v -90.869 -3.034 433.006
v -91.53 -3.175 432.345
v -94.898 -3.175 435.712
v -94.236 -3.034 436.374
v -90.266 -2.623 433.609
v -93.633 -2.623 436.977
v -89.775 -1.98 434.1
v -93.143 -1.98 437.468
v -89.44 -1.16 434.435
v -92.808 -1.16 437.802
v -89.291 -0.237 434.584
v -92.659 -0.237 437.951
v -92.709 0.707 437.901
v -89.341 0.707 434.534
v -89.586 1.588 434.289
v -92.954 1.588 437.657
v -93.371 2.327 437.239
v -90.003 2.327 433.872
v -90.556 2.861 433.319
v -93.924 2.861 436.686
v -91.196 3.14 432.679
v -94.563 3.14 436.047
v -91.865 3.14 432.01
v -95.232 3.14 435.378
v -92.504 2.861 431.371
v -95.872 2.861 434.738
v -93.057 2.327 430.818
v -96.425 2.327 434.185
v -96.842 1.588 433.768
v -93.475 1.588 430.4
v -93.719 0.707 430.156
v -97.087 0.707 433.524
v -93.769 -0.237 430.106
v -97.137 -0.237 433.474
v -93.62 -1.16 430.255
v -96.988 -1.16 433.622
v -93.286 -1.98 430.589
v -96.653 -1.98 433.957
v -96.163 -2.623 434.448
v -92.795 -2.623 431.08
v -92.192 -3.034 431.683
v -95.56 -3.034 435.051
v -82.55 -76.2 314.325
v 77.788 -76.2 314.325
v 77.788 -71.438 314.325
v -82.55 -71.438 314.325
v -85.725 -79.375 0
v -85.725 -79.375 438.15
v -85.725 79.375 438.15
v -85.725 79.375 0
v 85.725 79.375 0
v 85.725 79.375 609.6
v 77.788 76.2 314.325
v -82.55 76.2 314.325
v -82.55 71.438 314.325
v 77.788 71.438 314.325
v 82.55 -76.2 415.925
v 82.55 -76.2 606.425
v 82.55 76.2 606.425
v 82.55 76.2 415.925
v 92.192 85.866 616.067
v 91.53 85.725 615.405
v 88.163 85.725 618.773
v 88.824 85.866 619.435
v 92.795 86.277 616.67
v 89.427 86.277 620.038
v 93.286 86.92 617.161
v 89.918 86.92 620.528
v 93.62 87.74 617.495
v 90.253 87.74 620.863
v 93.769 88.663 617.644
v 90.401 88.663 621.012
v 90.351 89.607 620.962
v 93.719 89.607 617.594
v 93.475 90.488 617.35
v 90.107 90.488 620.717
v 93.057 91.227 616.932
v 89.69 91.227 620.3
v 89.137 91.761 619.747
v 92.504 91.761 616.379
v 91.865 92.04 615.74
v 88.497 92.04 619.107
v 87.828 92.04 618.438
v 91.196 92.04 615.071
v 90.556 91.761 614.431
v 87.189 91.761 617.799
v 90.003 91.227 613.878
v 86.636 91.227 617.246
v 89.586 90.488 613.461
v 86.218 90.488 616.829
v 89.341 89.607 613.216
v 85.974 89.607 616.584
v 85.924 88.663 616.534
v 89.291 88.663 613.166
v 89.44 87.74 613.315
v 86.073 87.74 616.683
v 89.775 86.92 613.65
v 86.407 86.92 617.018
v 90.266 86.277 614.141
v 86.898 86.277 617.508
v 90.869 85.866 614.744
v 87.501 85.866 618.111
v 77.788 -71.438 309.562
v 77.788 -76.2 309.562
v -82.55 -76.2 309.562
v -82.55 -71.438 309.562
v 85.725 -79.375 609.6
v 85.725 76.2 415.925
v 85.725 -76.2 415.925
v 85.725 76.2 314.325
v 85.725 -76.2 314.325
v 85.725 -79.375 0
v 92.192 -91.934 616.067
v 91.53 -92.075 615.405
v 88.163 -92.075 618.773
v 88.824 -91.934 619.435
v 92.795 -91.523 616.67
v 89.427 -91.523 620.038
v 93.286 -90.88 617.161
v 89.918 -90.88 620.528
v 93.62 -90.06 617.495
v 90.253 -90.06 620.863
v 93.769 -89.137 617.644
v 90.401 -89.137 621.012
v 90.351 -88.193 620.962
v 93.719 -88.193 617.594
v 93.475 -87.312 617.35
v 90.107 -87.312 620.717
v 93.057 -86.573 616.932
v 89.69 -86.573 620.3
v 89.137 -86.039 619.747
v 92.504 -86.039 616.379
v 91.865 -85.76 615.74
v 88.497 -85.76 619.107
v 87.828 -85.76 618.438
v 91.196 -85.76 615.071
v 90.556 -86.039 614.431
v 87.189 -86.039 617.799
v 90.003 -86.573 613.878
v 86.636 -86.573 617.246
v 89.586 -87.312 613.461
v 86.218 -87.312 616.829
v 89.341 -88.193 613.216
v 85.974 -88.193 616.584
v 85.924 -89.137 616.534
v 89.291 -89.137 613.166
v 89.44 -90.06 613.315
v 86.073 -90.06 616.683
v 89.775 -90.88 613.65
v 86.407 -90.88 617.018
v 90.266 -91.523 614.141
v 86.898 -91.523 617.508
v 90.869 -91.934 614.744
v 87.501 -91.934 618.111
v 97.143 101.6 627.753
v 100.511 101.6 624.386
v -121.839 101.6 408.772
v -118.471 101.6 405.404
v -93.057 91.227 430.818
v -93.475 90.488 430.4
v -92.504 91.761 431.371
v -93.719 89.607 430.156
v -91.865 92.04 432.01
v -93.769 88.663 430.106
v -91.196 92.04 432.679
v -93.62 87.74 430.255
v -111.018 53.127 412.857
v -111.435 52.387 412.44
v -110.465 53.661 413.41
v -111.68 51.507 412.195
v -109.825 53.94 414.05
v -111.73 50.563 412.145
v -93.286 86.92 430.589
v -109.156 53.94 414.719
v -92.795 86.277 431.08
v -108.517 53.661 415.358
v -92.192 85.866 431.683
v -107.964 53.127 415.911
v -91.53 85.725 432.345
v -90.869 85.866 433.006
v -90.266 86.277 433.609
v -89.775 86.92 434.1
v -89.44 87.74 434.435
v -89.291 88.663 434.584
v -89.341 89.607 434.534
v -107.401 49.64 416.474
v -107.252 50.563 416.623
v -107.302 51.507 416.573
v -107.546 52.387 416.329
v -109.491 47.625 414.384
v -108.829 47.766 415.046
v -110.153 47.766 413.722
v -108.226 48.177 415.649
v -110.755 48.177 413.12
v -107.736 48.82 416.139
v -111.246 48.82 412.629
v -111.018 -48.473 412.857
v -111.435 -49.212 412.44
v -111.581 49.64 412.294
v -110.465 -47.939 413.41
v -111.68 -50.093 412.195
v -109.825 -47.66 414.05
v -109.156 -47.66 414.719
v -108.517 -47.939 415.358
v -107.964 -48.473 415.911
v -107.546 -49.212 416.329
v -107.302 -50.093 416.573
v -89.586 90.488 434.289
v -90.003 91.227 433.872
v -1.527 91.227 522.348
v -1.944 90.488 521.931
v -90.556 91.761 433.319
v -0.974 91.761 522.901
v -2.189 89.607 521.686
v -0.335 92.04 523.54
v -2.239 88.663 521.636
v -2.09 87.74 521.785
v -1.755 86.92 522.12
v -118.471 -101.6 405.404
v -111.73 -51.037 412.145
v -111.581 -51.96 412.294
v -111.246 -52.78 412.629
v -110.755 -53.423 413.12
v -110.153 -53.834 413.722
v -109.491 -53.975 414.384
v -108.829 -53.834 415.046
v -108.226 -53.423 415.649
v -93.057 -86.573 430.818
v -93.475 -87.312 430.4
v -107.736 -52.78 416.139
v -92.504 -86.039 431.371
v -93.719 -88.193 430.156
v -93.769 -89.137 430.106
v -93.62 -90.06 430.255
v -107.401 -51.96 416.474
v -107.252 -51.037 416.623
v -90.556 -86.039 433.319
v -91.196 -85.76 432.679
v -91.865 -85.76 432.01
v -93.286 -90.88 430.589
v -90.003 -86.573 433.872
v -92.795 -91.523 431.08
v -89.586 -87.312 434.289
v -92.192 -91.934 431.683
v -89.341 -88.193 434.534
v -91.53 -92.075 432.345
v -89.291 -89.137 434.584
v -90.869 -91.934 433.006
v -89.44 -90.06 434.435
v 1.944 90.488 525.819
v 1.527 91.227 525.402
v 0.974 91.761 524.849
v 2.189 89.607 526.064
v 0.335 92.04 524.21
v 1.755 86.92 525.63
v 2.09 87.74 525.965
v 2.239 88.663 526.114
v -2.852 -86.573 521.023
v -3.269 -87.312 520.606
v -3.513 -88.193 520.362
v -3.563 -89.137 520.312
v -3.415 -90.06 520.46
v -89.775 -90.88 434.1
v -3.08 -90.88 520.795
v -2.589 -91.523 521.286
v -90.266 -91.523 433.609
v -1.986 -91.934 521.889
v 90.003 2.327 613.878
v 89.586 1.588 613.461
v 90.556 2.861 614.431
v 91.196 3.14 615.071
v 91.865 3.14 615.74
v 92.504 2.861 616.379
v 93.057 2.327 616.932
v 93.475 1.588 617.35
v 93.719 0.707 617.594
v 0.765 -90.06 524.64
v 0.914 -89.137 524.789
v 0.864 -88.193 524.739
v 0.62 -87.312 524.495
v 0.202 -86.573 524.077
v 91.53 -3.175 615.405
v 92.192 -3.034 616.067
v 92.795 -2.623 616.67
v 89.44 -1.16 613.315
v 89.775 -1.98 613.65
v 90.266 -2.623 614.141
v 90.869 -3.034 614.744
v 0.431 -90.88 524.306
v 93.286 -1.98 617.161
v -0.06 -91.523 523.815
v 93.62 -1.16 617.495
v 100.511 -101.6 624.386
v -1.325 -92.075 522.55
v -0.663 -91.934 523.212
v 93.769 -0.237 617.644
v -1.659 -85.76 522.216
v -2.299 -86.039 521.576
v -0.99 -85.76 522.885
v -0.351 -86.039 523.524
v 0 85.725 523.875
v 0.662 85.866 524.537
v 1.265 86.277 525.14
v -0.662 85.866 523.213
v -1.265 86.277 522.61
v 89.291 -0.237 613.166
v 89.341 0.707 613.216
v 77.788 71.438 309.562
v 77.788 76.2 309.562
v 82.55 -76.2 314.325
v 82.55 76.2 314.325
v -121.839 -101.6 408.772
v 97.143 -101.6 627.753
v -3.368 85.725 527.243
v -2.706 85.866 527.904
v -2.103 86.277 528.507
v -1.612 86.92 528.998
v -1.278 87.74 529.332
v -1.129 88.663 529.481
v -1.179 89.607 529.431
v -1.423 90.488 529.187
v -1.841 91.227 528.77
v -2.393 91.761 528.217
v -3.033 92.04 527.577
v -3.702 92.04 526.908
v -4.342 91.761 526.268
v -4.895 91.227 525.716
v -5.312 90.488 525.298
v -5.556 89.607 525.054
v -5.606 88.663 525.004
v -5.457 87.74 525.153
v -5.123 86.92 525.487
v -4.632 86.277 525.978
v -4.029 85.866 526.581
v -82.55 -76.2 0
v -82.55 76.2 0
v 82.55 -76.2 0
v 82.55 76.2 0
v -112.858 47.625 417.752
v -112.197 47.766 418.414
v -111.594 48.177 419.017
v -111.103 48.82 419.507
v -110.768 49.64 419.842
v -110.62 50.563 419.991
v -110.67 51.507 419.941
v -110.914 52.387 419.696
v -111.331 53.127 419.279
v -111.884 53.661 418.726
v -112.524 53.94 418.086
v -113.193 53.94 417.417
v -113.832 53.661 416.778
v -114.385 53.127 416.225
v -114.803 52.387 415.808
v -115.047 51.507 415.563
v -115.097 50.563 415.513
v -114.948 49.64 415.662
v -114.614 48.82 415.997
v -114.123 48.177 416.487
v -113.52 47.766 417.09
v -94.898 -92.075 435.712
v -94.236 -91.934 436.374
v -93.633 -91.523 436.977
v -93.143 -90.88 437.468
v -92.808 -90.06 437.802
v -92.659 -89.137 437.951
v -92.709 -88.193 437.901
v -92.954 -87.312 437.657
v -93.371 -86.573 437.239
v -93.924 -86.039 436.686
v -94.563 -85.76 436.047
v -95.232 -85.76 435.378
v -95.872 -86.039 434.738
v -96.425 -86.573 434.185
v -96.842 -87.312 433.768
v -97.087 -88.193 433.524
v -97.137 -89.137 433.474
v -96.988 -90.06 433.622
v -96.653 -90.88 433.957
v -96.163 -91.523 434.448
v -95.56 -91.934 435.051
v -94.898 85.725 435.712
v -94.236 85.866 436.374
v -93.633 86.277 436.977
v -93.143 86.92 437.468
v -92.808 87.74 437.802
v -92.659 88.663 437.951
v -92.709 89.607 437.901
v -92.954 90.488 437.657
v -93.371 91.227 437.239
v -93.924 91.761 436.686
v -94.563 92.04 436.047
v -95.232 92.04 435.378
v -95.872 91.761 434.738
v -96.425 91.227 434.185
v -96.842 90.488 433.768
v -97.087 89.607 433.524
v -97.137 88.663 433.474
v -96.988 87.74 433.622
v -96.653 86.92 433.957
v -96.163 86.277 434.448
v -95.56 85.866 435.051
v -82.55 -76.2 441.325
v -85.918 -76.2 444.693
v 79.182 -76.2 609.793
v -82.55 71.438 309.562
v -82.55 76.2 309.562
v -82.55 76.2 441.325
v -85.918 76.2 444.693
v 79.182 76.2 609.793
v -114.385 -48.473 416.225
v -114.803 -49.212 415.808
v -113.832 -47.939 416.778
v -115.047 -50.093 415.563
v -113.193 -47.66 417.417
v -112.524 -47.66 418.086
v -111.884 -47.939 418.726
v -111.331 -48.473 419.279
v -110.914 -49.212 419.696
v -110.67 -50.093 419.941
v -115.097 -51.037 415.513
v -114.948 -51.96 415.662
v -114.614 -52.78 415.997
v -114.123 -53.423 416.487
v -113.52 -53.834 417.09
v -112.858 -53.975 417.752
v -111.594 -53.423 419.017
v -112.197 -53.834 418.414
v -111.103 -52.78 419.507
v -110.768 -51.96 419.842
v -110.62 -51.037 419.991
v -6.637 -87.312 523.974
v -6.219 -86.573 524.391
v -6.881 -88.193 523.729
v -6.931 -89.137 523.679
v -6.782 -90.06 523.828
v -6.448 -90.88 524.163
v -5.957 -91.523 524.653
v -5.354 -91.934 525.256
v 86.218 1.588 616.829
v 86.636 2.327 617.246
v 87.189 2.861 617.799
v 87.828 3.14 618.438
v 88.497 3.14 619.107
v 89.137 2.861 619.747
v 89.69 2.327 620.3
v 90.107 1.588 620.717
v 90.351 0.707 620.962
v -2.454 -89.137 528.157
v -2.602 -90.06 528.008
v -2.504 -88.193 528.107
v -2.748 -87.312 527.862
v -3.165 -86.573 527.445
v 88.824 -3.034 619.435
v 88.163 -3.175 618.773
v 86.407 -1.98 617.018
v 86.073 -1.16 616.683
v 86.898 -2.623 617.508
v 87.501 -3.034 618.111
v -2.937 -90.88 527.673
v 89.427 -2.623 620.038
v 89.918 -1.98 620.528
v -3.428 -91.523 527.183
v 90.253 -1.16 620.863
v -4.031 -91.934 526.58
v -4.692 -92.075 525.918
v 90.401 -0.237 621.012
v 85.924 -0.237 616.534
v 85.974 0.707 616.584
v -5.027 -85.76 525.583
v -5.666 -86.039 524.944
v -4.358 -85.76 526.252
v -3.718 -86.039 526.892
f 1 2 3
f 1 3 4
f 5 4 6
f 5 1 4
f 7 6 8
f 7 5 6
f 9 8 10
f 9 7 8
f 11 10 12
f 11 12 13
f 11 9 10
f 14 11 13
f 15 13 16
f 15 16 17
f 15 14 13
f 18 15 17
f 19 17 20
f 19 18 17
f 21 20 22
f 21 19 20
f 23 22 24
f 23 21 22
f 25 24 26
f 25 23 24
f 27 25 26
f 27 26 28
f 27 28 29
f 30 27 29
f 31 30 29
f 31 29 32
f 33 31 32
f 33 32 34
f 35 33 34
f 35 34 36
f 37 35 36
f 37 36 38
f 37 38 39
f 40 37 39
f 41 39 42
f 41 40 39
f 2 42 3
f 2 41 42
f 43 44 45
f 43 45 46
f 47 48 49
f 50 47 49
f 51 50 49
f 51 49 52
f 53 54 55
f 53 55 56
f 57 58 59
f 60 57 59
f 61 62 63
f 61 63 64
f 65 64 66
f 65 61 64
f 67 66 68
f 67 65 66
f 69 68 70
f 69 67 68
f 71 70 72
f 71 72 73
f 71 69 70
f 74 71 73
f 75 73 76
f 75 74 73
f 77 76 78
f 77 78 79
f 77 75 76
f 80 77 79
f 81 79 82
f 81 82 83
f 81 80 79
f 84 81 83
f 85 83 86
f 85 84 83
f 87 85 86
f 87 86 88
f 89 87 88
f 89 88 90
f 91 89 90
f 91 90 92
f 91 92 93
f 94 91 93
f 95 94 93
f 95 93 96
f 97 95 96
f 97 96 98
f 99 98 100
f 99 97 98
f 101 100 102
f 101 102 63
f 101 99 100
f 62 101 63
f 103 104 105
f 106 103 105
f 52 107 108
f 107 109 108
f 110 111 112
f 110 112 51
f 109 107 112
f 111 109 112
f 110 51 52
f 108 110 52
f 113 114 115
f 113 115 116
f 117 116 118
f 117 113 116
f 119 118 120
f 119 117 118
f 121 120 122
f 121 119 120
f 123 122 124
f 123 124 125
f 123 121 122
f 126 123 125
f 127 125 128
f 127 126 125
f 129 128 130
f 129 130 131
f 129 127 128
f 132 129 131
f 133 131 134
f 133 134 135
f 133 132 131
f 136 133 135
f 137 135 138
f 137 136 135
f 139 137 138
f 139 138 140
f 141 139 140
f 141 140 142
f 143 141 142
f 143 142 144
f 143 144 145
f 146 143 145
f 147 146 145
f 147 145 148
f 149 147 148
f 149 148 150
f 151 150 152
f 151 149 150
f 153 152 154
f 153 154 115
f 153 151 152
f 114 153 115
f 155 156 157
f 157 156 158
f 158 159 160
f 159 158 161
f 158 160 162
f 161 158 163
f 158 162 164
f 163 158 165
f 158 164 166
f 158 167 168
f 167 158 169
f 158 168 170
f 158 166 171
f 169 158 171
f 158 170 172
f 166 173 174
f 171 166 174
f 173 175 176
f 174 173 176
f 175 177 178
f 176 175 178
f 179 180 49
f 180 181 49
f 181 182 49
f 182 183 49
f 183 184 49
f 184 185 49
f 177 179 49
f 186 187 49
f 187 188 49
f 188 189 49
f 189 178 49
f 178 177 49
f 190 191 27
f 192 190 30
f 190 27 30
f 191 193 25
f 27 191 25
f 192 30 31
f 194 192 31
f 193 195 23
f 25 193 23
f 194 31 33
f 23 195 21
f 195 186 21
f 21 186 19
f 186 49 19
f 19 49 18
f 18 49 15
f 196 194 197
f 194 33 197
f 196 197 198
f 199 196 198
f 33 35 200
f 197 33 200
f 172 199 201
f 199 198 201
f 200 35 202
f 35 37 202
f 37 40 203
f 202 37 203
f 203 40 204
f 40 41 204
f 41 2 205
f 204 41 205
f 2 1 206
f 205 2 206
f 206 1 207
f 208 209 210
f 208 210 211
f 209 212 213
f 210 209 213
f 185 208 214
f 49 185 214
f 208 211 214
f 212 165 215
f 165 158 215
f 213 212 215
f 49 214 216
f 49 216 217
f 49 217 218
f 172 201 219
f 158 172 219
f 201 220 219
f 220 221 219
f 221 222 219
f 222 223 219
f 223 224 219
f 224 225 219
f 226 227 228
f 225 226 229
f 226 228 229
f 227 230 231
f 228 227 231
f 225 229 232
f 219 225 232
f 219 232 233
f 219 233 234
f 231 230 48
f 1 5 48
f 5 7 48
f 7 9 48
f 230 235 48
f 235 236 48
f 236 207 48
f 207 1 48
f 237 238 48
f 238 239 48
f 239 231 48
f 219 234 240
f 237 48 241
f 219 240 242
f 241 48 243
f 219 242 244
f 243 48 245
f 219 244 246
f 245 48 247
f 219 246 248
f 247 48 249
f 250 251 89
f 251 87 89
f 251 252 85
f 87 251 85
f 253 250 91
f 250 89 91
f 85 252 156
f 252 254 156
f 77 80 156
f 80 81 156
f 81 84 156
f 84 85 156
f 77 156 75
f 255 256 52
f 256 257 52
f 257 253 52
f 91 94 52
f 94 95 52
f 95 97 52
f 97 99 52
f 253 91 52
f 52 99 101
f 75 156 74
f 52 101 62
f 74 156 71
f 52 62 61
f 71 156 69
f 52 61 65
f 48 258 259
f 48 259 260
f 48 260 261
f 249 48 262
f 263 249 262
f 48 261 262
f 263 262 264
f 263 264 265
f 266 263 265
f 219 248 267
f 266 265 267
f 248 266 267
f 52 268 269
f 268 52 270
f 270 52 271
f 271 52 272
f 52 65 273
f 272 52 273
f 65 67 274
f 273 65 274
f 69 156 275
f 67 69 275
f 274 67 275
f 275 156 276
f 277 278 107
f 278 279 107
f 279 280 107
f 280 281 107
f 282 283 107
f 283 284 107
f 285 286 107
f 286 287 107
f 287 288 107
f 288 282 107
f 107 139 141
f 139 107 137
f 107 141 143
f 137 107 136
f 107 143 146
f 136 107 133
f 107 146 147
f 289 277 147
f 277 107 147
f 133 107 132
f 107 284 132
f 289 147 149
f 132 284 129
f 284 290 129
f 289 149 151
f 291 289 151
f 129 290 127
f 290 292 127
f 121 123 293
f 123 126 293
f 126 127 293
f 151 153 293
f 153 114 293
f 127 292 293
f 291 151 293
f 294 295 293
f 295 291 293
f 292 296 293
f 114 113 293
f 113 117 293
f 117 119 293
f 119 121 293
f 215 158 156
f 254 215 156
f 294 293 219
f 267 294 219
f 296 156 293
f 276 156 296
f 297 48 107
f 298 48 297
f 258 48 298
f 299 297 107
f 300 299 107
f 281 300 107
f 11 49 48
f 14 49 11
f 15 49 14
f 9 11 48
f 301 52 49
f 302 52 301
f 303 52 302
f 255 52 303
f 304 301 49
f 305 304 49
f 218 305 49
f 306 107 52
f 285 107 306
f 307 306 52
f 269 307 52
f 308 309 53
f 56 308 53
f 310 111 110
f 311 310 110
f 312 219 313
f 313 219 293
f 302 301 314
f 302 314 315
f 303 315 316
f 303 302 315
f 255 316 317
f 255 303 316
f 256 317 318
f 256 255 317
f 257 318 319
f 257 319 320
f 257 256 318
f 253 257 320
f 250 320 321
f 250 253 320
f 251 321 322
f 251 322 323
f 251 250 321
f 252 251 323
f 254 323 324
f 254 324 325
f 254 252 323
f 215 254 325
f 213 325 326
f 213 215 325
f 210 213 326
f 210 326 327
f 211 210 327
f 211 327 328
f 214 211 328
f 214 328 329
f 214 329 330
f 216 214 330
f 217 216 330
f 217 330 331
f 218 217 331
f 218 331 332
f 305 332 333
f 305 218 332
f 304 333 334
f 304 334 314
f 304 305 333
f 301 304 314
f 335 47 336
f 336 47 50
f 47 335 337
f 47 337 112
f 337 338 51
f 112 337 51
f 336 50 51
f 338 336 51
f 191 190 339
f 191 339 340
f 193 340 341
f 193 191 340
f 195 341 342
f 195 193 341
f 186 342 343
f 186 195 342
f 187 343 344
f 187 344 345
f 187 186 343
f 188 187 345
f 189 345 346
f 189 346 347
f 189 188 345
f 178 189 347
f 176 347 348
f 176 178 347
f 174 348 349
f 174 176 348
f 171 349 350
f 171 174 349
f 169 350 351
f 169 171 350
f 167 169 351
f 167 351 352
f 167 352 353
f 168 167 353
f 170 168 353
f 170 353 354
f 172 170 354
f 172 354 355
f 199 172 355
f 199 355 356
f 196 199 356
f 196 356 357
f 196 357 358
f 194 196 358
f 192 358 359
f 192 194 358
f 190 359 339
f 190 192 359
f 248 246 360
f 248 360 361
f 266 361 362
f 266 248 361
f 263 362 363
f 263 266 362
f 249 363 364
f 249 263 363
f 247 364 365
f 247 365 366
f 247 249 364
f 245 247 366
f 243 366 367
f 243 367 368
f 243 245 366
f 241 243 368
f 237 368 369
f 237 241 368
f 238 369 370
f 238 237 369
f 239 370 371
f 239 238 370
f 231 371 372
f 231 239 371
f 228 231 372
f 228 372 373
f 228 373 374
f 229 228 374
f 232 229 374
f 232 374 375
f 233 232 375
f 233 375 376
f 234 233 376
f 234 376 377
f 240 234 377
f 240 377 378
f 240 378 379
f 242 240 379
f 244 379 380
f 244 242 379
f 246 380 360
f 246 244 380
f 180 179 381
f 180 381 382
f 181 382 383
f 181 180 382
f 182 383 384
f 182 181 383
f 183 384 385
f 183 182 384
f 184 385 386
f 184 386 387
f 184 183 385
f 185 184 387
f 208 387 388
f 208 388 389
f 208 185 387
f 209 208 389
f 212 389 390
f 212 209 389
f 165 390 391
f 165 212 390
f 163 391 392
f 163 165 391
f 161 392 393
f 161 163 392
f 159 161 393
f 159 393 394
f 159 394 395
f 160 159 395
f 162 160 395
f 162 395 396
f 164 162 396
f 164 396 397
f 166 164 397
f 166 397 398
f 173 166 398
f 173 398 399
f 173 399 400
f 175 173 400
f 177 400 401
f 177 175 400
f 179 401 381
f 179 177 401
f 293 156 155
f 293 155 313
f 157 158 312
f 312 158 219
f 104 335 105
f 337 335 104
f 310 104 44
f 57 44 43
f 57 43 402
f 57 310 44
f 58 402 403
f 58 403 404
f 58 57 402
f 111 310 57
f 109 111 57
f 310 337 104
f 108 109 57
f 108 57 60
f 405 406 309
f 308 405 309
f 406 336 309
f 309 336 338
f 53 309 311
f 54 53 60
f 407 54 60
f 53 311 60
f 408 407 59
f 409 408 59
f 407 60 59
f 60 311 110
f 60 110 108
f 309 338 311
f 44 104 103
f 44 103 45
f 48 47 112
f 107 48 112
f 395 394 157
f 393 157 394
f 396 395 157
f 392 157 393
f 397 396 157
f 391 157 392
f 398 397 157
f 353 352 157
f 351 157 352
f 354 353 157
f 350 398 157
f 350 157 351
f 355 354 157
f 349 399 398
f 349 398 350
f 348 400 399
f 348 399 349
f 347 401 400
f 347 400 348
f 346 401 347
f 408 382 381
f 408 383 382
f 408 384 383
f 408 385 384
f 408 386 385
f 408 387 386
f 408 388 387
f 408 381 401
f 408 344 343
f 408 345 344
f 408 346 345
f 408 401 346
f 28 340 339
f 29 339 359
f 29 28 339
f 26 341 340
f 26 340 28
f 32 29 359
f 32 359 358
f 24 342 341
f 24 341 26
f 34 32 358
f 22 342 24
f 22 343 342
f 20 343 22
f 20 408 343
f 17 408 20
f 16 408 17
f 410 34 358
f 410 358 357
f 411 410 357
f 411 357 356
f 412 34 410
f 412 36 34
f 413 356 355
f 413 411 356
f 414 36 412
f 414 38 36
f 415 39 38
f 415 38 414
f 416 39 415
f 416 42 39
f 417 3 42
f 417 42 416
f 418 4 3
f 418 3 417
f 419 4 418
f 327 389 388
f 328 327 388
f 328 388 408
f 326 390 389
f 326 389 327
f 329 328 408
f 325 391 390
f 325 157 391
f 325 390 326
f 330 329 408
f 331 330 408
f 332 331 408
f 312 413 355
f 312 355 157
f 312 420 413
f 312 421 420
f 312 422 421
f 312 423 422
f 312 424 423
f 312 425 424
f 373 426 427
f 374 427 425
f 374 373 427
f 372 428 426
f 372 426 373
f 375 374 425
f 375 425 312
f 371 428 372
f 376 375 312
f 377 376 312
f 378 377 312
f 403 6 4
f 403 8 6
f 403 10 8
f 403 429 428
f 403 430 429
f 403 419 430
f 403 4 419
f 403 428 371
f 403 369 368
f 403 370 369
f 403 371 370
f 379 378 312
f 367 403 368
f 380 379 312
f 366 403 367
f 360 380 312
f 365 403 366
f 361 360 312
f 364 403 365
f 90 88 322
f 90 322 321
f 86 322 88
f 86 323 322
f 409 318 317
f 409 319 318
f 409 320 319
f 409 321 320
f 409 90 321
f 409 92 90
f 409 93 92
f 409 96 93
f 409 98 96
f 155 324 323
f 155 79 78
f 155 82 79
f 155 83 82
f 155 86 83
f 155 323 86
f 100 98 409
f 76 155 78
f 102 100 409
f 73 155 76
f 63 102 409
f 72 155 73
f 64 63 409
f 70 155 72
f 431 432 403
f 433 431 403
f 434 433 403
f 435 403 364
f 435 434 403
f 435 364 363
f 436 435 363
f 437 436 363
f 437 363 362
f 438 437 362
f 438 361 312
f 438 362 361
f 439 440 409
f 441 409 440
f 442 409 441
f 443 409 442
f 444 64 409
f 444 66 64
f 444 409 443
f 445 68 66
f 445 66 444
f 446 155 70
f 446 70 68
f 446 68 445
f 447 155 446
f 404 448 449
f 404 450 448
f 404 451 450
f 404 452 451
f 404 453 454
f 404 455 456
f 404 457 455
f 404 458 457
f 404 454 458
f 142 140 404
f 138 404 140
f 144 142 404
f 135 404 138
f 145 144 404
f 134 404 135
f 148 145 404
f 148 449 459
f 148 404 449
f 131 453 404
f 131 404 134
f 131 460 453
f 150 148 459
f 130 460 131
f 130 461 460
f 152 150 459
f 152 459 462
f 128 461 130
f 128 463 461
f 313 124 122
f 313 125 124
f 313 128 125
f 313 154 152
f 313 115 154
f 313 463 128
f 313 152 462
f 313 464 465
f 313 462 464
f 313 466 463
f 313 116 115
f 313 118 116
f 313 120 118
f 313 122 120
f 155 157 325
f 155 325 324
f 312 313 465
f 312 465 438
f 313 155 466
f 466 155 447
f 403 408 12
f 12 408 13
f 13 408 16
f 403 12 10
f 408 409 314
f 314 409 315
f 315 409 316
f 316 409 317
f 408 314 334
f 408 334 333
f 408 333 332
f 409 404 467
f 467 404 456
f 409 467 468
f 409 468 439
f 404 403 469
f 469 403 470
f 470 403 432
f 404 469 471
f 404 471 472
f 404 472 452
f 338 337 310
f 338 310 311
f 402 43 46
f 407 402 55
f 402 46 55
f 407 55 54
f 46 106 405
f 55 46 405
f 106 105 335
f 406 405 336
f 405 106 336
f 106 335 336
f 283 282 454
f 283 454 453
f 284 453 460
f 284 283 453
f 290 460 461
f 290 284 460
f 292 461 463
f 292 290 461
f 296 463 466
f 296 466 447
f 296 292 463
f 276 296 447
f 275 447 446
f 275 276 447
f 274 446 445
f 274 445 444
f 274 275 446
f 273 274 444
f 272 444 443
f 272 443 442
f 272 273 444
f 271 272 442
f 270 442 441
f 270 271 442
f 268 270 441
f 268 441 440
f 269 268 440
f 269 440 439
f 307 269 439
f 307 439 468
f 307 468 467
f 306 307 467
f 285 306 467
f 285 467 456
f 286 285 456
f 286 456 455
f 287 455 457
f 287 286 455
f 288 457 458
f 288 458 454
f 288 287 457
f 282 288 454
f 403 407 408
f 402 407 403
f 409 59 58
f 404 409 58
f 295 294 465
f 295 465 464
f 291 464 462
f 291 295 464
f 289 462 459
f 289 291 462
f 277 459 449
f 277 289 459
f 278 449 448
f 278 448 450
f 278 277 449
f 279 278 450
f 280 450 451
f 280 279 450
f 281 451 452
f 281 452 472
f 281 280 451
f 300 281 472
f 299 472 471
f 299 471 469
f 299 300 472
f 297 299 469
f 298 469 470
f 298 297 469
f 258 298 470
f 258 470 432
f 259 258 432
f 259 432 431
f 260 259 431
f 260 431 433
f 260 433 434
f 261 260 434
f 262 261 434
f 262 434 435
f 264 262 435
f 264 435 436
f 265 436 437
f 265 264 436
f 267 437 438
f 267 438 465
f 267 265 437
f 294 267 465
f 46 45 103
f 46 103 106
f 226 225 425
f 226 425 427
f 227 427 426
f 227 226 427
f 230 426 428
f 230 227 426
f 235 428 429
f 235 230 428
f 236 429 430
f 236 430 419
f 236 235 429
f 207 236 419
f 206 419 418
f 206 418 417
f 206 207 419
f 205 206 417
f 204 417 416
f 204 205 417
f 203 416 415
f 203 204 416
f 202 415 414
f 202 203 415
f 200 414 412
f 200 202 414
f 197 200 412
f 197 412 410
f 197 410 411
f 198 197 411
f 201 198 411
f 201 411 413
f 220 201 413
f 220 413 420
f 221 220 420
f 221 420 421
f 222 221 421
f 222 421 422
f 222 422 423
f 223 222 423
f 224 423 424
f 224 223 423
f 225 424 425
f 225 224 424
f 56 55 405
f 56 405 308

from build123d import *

# Parameters (mm, degrees)
F0_W      = 171.45
F0_H      = 158.75
F0_W_2    = 165.1
F0_H_2    = 152.4
F1_DEPTH  = 609.6
F3_DEPTH  = 158.751
F4_W      = 203.2
F4_H      = 284.28666
F4_R      = 3.175
F4_W_2    = 152.4
F4_H_2    = 233.48666
F4_H_3    = 25.4
F5_DEPTH  = 4.7625
F6_W      = 152.4
F6_H      = 101.6
F7_DEPTH  = 25.4
F8_W      = 160.3375
F8_H      = 4.7625
F9_DEPTH  = 4.7625
F10_W     = 160.3375
F10_H     = 4.7625
F11_DEPTH = 4.7625


with BuildPart() as f1:
    # F0 (on Top) → F1 (new body)
    with BuildSketch(Plane.XY):
        Rectangle(F0_W, F0_H)
        Rectangle(F0_W_2, F0_H_2, mode=Mode.SUBTRACT)
    extrude(amount=F1_DEPTH)

    # F2 (on face) → F3 (cut, through all)
    with BuildSketch(Plane.XZ.offset(79.375)):
        Polygon((-85.725, 438.15), (85.725, 609.6), (-85.725, 609.6), align=None)
    extrude(amount=-F3_DEPTH, mode=Mode.SUBTRACT)

    # F4 (on face) → F5 (join)
    with BuildSketch(Plane(origin=(-261.9375, 0, 261.9375), x_dir=(0, -1, 0), z_dir=(-0.707107, 0, 0.707107))):
        with Locations((0, 370.435565)):
            Rectangle(F4_W, F4_H)
        with Locations((-88.9, 240.992235)):
            Circle(F4_R, mode=Mode.SUBTRACT)
        with Locations((0, 240.992235)):
            Circle(F4_R, mode=Mode.SUBTRACT)
        with Locations((88.9, 240.992235)):
            Circle(F4_R, mode=Mode.SUBTRACT)
        with Locations((-88.9, 370.435565)):
            Circle(F4_R, mode=Mode.SUBTRACT)
        with Locations((0, 370.435565)):
            Rectangle(F4_W_2, F4_H_2, mode=Mode.SUBTRACT)
        with Locations((-88.9, 499.878895)):
            Circle(F4_R, mode=Mode.SUBTRACT)
        with Locations((0, 499.878895)):
            Circle(F4_R, mode=Mode.SUBTRACT)
        with Locations((88.9, 368.56214)):
            Circle(F4_R, mode=Mode.SUBTRACT)
        with Locations((88.9, 499.878895)):
            Circle(F4_R, mode=Mode.SUBTRACT)
        with Locations((0, 215.592235)):
            Rectangle(F4_W, F4_H_3)
        with Locations((-50.8, 215.592235)):
            Circle(F4_R, mode=Mode.SUBTRACT)
        with Locations((50.8, 215.592235)):
            Circle(F4_R, mode=Mode.SUBTRACT)
    extrude(amount=F5_DEPTH)

    # F6 (on face) → F7 (cut)
    with BuildSketch(Plane.YZ.offset(85.725)):
        with Locations((0, 365.125)):
            Rectangle(F6_W, F6_H)
    extrude(amount=-F7_DEPTH, mode=Mode.SUBTRACT)

    # F8 (on face) → F9 (join)
    with BuildSketch(Plane(origin=(0, -76.2, 0), x_dir=(-1, 0, 0), z_dir=(0, 1, 0))):
        with Locations((2.38125, 311.94375)):
            Rectangle(F8_W, F8_H)
    extrude(amount=F9_DEPTH)

    # F10 (on face) → F11 (join)
    with BuildSketch(Plane.XZ.offset(-76.2)):
        with Locations((-2.38125, 311.94375)):
            Rectangle(F10_W, F10_H)
    extrude(amount=F11_DEPTH)


solid = f1.part
